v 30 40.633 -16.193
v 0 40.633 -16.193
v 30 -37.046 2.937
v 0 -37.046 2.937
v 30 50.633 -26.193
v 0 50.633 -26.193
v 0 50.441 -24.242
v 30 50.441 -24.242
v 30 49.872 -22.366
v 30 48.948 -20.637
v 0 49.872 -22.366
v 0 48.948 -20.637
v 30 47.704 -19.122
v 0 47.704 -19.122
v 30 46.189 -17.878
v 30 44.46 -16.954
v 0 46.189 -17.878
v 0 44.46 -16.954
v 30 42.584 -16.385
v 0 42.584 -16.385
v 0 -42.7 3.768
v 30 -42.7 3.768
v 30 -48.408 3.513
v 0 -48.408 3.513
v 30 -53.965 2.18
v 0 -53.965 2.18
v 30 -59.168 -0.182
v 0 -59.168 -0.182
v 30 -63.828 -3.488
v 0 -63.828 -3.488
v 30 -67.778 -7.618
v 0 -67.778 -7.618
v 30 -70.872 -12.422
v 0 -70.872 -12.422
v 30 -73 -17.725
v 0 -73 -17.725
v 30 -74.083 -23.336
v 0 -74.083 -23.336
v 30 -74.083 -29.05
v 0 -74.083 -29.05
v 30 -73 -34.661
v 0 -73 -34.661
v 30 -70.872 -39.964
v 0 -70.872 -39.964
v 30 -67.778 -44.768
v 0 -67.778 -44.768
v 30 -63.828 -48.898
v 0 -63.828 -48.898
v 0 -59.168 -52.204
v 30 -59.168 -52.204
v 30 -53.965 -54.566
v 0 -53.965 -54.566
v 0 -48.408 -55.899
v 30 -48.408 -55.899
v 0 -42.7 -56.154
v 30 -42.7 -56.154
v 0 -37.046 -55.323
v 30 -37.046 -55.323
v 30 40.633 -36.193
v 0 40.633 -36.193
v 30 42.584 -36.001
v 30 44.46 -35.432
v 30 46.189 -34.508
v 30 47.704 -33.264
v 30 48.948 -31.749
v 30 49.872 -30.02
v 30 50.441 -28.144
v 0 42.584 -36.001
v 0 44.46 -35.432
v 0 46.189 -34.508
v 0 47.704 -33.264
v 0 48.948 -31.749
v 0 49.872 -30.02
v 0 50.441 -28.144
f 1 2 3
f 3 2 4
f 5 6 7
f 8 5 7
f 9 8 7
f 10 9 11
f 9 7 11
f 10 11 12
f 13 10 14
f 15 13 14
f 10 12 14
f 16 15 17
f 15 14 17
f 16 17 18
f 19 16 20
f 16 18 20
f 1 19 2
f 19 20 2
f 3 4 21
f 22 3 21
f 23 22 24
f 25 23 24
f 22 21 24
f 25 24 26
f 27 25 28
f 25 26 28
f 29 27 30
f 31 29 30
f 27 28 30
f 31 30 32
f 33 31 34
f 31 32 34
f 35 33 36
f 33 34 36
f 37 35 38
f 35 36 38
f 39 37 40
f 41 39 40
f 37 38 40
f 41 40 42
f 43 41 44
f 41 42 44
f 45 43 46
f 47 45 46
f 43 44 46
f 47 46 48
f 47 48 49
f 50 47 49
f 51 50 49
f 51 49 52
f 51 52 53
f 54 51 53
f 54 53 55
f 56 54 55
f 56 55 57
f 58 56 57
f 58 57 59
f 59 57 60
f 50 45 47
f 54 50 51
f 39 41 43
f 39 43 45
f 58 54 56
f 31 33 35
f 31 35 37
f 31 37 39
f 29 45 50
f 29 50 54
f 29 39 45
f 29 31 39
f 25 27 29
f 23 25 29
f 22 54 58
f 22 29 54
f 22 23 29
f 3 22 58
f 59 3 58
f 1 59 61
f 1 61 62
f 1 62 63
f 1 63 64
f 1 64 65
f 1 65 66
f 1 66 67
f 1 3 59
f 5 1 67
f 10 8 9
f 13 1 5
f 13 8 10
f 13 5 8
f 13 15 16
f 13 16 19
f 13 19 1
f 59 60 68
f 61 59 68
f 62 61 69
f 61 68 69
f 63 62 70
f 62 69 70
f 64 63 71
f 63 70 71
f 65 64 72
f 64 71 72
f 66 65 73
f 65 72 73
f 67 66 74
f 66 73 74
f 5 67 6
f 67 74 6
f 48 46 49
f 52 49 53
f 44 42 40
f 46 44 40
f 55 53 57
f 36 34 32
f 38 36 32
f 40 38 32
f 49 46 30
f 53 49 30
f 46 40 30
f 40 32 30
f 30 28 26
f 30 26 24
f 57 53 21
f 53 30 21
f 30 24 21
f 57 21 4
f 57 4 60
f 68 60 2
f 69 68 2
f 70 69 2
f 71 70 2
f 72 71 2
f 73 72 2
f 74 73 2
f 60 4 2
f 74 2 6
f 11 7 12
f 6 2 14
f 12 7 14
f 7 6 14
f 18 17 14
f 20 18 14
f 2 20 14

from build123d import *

# Parameters (mm, degrees)
F1_DEPTH = 30


with BuildPart() as f1:
    # F0 (on Right) → F1 (new body)
    with BuildSketch(Plane.YZ):
        with BuildLine():
            ThreePointArc((-37.046180943, -55.3226507139), (-20.6061644078, -44.6968900375), (-14.2198155139, -26.1929585246))
            ThreePointArc((-14.2198155139, -26.1929585246), (-20.6061644078, -7.6890270116), (-37.046180943, 2.9367336647))
            ThreePointArc((-37.046180943, 2.9367336647), (-74.2198155139, -26.1929585246), (-37.046180943, -55.3226507139))
        make_face()
        with BuildLine():
            ThreePointArc((-37.046180943, 2.9367336647), (-20.6061644078, -7.6890270116), (-14.2198155139, -26.1929585246))
            ThreePointArc((-14.2198155139, -26.1929585246), (-20.6061644078, -44.6968900375), (-37.046180943, -55.3226507139))
            Line((-37.046180943, -55.3226507139), (40.6329982284, -36.1929585246))
            ThreePointArc((40.6329982284, -36.1929585246), (30.6329982284, -26.1929585246), (40.6329982284, -16.1929585246))
            Line((40.6329982284, -16.1929585246), (-37.046180943, 2.9367336647))
        make_face()
        with BuildLine():
            ThreePointArc((50.6329982284, -26.1929585246), (47.7040660403, -19.1218907127), (40.6329982284, -16.1929585246))
            ThreePointArc((40.6329982284, -16.1929585246), (30.6329982284, -26.1929585246), (40.6329982284, -36.1929585246))
            ThreePointArc((40.6329982284, -36.1929585246), (47.7040660403, -33.2640263364), (50.6329982284, -26.1929585246))
        make_face()
    extrude(amount=F1_DEPTH)


solid = f1.part
